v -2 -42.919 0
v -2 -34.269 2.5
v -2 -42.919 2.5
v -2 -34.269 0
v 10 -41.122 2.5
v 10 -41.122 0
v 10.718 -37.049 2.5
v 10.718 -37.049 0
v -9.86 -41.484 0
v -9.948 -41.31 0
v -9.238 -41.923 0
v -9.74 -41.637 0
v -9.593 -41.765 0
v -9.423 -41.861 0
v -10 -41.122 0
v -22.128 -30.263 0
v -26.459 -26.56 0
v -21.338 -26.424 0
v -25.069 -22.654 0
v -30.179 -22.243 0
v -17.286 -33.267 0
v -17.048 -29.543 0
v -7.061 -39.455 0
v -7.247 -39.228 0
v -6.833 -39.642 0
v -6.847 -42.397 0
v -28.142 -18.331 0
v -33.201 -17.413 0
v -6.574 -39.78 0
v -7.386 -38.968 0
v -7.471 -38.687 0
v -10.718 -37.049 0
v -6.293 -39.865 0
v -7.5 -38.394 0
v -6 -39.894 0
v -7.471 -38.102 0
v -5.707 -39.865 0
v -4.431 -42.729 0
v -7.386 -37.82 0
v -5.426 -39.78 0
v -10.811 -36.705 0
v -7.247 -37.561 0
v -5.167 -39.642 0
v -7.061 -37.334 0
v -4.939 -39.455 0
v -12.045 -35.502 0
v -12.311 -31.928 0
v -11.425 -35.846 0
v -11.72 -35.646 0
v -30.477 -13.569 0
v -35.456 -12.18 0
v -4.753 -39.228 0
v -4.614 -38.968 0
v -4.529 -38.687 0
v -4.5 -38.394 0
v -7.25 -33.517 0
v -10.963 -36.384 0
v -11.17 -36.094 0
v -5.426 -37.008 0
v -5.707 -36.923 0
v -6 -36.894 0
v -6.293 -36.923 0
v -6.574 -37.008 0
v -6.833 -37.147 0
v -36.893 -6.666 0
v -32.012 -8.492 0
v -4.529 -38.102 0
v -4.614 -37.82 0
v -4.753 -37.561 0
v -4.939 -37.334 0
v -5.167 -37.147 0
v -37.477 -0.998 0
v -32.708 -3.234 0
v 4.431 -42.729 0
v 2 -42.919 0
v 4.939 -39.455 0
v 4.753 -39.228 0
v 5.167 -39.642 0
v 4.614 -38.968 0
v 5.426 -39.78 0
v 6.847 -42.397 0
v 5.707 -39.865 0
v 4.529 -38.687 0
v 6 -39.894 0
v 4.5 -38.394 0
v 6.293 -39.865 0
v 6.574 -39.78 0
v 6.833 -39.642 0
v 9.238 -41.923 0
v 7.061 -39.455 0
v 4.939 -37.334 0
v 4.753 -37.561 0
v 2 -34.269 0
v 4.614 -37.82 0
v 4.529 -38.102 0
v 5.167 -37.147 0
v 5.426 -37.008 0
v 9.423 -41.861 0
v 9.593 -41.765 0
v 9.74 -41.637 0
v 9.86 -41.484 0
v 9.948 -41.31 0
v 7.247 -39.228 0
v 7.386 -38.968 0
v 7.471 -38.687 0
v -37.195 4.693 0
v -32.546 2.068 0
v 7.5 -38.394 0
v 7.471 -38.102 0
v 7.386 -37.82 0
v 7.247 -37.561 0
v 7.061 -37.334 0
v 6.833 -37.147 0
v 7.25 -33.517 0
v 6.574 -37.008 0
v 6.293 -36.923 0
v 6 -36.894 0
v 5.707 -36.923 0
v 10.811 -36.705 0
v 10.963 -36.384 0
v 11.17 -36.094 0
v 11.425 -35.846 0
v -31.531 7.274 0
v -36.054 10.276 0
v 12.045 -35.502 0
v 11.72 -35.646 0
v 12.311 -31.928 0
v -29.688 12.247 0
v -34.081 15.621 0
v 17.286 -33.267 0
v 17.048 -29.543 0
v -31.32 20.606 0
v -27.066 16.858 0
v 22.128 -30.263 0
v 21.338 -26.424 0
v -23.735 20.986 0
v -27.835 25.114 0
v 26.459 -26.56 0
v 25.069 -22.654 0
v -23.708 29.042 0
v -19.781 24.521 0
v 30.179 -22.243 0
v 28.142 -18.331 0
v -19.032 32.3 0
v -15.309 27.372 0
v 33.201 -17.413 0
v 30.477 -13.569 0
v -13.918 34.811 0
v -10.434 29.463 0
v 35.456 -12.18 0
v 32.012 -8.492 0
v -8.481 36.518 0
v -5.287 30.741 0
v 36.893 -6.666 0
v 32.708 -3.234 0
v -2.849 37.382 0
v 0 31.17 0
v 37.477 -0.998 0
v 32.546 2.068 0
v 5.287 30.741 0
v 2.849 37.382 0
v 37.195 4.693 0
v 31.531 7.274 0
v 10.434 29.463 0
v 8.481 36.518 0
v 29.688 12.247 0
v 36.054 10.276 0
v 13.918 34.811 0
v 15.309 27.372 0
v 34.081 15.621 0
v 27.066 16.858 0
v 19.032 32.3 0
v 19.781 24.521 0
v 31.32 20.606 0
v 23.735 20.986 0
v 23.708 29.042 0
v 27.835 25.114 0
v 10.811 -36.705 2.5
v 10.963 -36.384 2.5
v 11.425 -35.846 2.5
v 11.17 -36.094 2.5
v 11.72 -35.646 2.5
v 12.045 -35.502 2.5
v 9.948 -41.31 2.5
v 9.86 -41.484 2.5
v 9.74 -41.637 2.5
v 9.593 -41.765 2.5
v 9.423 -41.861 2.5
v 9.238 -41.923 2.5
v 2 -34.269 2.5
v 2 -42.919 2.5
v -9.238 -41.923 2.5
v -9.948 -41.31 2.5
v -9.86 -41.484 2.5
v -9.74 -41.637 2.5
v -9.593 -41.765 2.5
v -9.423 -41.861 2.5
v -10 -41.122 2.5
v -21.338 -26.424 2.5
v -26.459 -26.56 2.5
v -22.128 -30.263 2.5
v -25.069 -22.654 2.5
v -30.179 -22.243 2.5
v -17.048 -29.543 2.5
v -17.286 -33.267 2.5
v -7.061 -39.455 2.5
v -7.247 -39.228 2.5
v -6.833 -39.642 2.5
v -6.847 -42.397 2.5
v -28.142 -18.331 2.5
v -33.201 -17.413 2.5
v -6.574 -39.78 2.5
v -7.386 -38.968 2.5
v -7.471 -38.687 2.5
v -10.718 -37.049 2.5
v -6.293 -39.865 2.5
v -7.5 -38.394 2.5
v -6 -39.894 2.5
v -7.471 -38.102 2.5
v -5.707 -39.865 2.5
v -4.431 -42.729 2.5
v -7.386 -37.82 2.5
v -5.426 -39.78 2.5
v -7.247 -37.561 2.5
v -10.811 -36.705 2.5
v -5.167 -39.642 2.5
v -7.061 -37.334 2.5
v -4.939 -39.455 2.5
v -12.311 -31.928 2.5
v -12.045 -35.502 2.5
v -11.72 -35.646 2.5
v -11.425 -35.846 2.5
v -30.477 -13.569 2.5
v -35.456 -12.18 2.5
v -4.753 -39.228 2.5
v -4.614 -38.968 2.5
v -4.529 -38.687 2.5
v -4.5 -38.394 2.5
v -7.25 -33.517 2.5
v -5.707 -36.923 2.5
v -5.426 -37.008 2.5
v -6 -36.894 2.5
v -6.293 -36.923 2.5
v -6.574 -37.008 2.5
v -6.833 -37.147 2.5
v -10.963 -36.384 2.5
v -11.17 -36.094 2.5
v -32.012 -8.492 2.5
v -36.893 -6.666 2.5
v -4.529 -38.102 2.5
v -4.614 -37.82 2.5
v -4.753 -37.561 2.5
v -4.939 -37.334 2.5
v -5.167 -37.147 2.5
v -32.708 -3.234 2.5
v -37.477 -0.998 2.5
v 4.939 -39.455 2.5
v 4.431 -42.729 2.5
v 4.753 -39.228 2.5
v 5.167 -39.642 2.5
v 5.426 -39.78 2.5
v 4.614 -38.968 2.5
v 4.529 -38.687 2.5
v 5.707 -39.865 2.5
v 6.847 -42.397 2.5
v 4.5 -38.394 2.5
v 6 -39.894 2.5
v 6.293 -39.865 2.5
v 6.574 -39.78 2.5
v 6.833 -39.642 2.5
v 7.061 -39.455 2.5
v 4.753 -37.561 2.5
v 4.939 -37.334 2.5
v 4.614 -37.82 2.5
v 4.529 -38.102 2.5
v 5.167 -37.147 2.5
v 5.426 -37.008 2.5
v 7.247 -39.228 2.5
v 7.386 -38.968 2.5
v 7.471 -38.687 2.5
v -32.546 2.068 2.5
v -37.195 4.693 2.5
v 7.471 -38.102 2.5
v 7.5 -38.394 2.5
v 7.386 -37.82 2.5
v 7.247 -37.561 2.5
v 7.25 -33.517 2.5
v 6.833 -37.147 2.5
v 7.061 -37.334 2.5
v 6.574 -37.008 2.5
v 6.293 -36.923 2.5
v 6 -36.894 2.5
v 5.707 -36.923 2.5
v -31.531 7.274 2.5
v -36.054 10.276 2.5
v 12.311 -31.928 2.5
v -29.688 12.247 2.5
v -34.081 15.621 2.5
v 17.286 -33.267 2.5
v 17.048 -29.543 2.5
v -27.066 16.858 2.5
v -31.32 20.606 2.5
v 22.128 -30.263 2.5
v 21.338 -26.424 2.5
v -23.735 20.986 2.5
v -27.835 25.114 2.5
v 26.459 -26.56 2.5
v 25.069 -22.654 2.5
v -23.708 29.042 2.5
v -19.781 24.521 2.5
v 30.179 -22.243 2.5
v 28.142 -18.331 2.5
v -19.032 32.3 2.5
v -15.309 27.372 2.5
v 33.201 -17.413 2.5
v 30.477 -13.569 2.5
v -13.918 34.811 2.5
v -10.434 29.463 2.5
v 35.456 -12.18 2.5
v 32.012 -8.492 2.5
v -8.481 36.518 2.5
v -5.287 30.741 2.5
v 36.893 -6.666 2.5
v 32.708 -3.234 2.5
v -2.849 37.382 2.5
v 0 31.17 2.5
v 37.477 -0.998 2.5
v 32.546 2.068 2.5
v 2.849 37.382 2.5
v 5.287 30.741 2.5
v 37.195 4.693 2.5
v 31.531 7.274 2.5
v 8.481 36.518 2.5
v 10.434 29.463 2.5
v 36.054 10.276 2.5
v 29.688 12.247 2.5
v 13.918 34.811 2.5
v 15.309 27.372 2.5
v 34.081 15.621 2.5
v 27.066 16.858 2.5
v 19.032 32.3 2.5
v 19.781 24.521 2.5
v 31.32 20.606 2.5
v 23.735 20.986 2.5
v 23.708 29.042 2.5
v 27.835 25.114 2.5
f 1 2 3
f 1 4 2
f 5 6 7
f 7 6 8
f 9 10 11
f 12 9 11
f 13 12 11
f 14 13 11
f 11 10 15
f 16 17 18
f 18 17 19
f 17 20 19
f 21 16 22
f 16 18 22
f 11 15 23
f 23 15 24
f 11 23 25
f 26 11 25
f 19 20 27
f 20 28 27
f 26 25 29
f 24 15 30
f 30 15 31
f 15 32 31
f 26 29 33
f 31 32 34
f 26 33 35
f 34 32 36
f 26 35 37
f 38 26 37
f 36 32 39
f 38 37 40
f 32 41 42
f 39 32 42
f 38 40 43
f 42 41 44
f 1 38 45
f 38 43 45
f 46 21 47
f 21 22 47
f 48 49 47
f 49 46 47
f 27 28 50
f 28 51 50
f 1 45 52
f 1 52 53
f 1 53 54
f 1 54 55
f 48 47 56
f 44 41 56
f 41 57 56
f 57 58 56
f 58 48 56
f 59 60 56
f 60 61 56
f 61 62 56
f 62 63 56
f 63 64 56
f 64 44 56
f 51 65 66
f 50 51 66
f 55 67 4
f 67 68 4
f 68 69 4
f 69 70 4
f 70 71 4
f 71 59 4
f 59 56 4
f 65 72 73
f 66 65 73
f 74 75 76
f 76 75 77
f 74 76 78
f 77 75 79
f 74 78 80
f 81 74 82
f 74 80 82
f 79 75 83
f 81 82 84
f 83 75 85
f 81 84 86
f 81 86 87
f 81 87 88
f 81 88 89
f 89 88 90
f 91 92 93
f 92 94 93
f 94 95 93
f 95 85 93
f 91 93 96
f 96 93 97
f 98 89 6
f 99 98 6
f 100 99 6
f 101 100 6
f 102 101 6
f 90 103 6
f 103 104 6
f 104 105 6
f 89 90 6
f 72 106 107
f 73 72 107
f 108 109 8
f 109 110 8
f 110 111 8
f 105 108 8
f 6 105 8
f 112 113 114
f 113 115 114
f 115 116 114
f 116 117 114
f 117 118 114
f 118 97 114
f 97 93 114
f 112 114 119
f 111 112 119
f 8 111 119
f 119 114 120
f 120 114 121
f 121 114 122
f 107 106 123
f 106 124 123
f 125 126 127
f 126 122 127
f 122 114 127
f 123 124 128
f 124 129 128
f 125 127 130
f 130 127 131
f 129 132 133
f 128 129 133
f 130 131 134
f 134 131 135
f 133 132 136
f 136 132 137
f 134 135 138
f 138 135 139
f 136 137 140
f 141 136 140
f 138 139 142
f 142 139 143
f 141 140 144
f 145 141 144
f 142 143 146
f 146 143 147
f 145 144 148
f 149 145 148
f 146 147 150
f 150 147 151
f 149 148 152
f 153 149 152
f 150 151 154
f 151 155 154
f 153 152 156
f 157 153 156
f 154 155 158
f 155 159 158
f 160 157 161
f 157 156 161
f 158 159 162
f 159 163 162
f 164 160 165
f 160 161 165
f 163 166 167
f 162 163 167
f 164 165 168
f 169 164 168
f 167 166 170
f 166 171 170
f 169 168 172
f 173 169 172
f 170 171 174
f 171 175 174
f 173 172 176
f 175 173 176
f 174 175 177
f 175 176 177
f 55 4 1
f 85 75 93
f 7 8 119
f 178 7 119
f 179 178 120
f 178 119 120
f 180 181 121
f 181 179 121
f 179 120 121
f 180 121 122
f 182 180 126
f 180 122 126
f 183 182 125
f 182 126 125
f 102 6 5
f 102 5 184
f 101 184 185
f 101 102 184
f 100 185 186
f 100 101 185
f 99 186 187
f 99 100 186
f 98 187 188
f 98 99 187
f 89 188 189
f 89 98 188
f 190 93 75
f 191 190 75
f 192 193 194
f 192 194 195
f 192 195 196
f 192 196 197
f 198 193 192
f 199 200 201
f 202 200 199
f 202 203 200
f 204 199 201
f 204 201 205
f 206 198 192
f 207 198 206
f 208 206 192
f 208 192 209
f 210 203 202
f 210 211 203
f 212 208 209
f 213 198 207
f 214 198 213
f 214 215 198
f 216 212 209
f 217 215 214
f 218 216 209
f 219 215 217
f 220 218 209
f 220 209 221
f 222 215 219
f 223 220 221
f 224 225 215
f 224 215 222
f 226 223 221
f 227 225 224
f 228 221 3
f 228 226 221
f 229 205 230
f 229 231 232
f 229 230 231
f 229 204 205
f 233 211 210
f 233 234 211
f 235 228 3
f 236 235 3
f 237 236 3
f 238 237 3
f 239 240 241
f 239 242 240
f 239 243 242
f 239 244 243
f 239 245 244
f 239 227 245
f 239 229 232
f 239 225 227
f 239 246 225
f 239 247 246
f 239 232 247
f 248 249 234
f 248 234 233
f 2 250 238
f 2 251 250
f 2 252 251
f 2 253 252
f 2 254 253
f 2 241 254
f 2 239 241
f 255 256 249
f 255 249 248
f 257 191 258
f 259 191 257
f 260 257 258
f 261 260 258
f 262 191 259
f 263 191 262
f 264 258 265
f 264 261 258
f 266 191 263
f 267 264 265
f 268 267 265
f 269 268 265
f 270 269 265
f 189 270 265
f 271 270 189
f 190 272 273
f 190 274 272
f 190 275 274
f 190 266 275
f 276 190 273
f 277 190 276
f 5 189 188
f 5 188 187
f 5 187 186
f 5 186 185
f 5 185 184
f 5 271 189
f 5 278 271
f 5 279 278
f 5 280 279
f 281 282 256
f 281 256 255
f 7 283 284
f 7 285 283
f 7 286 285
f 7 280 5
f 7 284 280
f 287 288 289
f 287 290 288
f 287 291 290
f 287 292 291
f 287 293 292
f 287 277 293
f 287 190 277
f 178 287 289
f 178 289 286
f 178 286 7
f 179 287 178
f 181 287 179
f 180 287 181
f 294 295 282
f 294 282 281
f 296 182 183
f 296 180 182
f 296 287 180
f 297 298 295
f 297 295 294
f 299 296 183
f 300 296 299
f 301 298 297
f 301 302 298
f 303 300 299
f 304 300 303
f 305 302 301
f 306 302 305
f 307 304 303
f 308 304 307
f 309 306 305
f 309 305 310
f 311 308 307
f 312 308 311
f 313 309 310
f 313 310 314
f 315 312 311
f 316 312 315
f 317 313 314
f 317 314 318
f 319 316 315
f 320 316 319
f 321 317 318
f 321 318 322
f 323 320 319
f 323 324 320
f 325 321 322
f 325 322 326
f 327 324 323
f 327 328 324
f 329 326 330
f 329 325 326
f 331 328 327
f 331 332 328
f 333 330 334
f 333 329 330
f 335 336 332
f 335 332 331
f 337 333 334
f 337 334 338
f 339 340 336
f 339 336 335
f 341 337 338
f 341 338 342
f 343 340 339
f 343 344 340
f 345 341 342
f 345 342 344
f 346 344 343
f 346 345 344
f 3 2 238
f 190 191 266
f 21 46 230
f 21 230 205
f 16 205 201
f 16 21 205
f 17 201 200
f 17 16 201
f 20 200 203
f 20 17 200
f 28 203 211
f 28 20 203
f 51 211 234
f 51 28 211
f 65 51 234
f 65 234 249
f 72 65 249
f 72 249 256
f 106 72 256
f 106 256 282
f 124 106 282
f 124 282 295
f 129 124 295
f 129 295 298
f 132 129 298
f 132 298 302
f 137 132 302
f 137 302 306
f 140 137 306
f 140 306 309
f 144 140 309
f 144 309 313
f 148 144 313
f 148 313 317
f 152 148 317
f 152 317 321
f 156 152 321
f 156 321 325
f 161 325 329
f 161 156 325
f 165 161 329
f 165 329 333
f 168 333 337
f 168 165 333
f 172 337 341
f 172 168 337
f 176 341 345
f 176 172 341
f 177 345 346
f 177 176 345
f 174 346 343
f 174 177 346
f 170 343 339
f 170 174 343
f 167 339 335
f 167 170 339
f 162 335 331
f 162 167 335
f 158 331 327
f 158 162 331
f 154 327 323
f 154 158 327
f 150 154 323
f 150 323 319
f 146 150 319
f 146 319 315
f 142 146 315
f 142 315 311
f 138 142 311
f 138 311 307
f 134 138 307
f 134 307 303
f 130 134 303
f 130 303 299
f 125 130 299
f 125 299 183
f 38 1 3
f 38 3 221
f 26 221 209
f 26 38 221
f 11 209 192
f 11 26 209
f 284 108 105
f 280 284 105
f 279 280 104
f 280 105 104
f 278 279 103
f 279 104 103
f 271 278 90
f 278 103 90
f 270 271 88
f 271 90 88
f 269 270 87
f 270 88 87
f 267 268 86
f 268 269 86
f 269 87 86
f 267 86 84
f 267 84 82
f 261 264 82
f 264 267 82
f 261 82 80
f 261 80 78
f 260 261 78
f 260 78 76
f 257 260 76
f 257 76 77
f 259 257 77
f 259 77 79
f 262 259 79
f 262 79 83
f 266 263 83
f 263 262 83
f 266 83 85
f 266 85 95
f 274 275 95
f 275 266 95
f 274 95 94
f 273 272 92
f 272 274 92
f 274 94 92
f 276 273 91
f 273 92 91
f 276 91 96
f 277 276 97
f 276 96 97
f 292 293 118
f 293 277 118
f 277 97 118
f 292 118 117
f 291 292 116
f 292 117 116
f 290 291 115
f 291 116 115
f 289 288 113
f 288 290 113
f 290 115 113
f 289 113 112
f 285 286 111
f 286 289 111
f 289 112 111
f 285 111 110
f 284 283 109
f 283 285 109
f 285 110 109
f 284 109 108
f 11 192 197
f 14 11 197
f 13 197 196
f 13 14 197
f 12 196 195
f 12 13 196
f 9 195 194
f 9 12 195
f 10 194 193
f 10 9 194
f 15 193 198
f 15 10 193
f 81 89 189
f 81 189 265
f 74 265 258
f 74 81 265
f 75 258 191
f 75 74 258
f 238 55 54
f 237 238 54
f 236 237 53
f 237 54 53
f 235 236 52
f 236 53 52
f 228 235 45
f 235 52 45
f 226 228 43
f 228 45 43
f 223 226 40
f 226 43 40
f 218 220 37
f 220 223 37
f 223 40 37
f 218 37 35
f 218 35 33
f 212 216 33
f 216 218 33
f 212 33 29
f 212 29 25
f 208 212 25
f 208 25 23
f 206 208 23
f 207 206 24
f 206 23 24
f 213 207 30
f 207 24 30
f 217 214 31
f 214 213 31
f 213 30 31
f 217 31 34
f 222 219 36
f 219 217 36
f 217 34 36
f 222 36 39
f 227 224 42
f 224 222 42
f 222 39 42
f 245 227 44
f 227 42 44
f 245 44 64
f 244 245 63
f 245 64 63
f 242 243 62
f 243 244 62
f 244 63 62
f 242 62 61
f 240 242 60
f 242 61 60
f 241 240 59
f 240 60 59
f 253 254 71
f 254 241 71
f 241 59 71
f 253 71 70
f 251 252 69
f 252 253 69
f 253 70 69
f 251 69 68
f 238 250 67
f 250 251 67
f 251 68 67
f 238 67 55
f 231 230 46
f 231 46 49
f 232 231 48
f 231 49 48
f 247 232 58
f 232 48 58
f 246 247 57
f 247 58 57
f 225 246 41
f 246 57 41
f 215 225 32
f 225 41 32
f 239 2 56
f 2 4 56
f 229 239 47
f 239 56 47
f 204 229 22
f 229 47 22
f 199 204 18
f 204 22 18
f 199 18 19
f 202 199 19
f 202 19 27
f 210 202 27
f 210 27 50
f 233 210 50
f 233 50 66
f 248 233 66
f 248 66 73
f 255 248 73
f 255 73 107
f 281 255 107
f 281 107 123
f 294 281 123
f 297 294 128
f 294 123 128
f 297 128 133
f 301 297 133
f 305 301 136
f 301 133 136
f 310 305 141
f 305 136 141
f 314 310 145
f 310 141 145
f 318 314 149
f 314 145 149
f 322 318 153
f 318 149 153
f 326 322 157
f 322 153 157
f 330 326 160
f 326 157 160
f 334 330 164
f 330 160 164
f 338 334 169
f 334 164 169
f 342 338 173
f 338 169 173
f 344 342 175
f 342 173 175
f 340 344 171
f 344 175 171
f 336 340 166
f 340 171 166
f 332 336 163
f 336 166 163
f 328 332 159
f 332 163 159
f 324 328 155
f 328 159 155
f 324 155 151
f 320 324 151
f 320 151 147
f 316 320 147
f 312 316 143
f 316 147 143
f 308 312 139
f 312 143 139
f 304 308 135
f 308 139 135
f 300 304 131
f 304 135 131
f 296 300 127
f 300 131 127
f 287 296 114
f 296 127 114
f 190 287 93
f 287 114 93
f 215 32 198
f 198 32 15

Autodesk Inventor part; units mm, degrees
ref_plane "YZ Plane" through (0, 0, 0) normal (1, 0, 0) x (0, 1, 0)
ref_plane "XZ Plane" through (0, 0, 0) normal (0, 1, 0) x (-1, 0, 0)
sketch "草图1" plane through (0, 0, 0) normal (0, 0, 1) x (1, 0, 0)
  arc A0 (2, -34.2689) -> (-2, -34.2689) centre (0, -1.58) ccw
  line L0 (0, 47.3657) -> (0, -51.0943) projected
  line L1 (-46.62, 0) -> (46.62, 0) projected
  line L2 (-2, -34.2689) -> (-2, -42.9189)
  line L3 (-2, -6.5402) -> (-2, -13.29) construction
  line L4 (-2.7947, 37.49) -> (3.6722, 37.49) construction
  arc A1 (12.0452, -35.5023) -> (-12.0452, -35.5023) centre (0, 0) ccw
  arc A2 (-9.2384, -41.923) -> (-2, -42.9189) centre (0, -1.58) ccw
  arc A3 (-10, -41.1218) -> (-9.2384, -41.923) centre (-9.0152, -40.9482) ccw
  arc A4 (-10.7182, -37.049) -> (-12.0452, -35.5023) centre (-12.6878, -37.3963) ccw
  line L5 (2, -34.2689) -> (2, -42.9189)
  line L6 (2, -6.5402) -> (2, -13.29) construction
  arc A5 (2, -42.9189) -> (9.2384, -41.923) centre (0, -1.58) ccw
  arc A6 (9.2384, -41.923) -> (10, -41.1218) centre (9.0152, -40.9482) ccw
  circle A7 centre (-6, -38.3943) radius 1.5
  circle A8 centre (6, -38.3943) radius 1.5
  line L7 (-10.7182, -37.049) -> (-10, -41.1218)
  arc A9 (12.0452, -35.5023) -> (10.7182, -37.049) centre (12.6878, -37.3963) ccw
  line L8 (10, -41.1218) -> (10.7182, -37.049)
  arc A10 (-4.8129, -38.5682) -> (5.574, -38.4612) centre (0, -1.58) ccw construction
  dimension "d0" = 65.5
  dimension "d1" = 8.65
  dimension "d6" = 2
  dimension "d8" = 1.58
  dimension "d9" = 1
  dimension "d10" = 2
  dimension "d12" = 3
  dimension "d13" = 3
  dimension "d43" = 10
  dimension "d44" = 37.3
  dimension "d45" = 12
  dimension "d46" = 20
  dimension "d47" = 6.32
extrude "轴承体" add sketch "草图1" along normal blind 2.5 contours A0 L1 A1 A9 L8 A6 A5 L5 | A0 L0 A1 L1 | A0 L1 A1 L0 | A0 L2 A2 A3 L7 A4 A1 L1
ref_plane "Work Plane1" through (0, -1.58, 0) normal (1, 0, 0) x (0, 0, 1)
equation "\"d0\" = ND"
equation "\"d1\" = SRB2"
equation "\"d6\" = 0.5 * B1"
equation "\"d8\" = C1"
equation "\"d9\" = R3"
equation "\"d10\" = R2"
equation "\"d12\" = SD5"
equation "\"d13\" = SD5"
equation "\"d44\" = R1"
equation "\"d45\" = B2"
equation "\"d46\" = L"
equation "\"d47\" = SRB1"
equation "\"d2\" = SD"
equation "\"SD\" = 2.5"
equation "\"SRB1\" = 6.32"
equation "\"ND\" = 65.5"
equation "\"SRB2\" = 8.65"
equation "\"SD5\" = 3"
equation "\"B1\" = 4"
equation "\"R2\" = 2"
equation "\"R3\" = 1"
equation "\"B2\" = 12"
equation "\"R1\" = 37.3"
equation "\"C1\" = 1.58"
equation "\"SD3\" = 65.5"
equation "\"WDMAX\" = 72"
equation "\"H1\" = 0"
properties part number "弹性挡圈GB 894.1-86 - 70" material "钢，软"
